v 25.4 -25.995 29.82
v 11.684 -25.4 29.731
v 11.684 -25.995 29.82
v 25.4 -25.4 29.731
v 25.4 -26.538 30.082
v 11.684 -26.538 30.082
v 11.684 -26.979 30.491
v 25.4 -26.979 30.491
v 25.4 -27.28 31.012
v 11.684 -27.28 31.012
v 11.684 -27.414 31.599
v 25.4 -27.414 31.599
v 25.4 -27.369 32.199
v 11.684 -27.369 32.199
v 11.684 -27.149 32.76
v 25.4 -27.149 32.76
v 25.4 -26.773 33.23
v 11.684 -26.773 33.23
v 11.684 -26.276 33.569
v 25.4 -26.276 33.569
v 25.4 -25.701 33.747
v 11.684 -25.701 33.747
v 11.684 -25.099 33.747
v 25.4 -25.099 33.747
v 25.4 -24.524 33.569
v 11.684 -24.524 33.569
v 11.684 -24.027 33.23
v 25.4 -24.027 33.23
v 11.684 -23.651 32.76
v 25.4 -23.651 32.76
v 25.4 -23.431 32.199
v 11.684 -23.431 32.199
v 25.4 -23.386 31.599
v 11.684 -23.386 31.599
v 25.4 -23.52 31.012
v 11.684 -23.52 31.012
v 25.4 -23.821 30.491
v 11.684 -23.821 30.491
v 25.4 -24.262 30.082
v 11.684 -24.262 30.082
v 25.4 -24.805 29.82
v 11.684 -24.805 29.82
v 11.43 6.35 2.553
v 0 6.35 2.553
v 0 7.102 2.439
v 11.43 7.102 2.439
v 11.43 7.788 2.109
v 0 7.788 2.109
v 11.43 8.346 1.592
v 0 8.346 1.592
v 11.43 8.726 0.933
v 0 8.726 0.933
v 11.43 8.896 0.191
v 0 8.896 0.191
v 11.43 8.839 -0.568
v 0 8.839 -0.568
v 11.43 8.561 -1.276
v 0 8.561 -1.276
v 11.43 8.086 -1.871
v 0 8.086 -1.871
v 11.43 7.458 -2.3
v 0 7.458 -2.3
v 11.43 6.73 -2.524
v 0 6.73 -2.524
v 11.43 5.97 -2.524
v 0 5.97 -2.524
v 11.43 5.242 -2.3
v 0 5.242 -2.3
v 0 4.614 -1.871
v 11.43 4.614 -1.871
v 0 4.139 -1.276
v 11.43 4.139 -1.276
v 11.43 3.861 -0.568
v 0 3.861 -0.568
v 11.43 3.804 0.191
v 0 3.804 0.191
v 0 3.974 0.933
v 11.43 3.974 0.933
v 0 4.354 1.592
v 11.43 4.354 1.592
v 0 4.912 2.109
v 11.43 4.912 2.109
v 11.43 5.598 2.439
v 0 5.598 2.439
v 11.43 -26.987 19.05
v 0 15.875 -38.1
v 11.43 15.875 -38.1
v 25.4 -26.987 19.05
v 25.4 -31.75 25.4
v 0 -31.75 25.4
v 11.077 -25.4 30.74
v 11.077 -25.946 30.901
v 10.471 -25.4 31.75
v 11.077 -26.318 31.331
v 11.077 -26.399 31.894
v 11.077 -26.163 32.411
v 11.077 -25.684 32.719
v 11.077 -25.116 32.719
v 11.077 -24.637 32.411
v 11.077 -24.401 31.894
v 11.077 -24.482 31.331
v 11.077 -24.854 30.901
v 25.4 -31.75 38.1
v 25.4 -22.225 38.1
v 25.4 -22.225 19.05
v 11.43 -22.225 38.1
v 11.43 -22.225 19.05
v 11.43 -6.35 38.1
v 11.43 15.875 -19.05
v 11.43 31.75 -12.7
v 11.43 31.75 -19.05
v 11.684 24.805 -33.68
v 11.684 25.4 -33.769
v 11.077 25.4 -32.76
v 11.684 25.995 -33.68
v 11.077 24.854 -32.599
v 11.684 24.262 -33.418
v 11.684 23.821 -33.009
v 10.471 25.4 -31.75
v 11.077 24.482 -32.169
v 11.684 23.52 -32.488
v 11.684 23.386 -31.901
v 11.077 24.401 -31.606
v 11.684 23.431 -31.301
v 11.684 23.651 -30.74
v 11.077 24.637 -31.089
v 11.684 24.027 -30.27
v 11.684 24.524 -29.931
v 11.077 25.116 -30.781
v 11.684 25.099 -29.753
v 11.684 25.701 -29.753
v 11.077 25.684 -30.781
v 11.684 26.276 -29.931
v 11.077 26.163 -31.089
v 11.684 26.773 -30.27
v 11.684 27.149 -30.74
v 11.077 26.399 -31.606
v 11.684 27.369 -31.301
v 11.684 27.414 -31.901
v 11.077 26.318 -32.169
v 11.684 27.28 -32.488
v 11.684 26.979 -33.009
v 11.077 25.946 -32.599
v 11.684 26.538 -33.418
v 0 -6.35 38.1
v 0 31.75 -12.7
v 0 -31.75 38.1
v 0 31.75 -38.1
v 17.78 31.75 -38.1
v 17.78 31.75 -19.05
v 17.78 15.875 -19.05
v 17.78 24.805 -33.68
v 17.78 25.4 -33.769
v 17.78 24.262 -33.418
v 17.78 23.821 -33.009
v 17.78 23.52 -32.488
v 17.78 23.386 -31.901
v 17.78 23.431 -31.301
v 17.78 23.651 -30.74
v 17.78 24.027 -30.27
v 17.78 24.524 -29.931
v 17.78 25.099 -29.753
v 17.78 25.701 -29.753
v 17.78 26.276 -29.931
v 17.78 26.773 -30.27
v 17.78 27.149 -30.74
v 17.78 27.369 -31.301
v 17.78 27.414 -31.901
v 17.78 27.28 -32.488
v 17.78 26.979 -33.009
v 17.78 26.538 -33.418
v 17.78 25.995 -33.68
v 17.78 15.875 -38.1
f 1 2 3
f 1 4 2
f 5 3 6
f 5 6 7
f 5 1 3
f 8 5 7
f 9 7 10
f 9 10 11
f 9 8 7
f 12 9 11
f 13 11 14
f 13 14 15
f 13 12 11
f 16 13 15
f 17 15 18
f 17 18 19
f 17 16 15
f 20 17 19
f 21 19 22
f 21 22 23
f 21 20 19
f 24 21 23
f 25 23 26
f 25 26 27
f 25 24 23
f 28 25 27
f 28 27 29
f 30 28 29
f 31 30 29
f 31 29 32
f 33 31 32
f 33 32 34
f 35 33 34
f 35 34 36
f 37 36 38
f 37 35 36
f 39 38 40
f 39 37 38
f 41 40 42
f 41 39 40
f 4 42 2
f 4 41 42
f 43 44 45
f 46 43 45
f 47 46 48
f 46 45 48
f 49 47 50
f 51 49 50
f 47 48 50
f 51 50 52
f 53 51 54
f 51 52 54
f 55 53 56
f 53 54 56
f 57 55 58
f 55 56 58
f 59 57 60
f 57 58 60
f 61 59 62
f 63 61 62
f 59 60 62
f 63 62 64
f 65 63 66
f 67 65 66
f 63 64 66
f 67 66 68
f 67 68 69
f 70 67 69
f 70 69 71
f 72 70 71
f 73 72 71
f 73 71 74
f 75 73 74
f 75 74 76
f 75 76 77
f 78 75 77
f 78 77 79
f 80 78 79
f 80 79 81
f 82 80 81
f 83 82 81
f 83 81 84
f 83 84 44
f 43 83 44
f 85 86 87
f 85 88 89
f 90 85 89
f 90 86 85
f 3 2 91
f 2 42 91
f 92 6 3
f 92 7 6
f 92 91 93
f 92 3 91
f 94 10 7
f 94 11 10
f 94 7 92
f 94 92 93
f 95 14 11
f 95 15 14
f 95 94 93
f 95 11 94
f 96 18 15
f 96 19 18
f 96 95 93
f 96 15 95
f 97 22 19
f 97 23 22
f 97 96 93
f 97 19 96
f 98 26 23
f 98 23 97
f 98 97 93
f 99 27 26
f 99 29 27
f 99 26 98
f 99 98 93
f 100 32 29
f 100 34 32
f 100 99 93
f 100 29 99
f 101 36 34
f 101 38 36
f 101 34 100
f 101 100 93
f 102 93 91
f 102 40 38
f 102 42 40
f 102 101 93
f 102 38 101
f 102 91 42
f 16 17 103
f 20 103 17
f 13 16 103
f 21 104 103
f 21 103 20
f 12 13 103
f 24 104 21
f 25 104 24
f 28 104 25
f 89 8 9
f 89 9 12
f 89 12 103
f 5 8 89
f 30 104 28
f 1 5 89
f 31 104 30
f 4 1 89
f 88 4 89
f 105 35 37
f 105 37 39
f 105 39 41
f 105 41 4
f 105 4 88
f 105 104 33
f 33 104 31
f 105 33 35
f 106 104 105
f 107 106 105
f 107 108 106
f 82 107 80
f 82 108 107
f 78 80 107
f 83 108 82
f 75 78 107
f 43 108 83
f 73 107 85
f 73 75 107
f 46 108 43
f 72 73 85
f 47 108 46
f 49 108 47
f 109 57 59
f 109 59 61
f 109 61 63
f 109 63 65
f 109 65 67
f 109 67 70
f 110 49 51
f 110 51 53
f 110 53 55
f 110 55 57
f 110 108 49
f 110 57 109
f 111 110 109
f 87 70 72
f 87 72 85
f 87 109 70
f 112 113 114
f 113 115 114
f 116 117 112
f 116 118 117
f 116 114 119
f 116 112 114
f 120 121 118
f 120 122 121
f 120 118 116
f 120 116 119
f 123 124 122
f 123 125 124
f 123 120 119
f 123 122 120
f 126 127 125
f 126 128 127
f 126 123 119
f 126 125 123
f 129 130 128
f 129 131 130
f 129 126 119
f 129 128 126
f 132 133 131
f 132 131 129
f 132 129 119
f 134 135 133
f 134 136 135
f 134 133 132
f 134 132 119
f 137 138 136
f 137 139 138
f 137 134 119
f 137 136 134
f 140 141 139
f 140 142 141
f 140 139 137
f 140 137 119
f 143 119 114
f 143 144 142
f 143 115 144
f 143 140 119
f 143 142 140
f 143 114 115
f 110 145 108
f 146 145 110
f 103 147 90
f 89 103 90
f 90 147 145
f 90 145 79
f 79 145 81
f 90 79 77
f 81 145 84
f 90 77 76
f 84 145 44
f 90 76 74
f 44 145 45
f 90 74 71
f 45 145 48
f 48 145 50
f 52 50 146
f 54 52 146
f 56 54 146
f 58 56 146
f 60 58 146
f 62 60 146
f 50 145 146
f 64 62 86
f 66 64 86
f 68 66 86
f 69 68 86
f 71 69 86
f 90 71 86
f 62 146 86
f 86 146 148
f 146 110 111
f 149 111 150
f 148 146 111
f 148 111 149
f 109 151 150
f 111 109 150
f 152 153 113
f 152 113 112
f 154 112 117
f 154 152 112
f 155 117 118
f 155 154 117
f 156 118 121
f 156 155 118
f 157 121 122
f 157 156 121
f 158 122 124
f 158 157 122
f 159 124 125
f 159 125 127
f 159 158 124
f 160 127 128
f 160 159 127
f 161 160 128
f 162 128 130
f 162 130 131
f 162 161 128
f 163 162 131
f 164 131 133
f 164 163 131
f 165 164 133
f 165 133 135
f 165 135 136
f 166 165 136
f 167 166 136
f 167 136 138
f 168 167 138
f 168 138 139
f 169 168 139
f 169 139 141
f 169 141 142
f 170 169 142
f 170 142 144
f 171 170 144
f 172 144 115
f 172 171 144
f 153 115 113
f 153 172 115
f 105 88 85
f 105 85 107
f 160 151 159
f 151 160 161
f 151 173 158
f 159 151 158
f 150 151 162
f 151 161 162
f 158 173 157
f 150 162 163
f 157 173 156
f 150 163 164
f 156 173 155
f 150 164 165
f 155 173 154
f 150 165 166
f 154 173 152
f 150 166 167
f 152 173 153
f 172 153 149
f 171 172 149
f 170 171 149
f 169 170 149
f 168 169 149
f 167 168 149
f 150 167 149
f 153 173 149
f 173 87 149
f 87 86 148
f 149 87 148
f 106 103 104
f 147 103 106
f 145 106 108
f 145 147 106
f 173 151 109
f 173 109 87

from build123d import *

# Parameters (mm, degrees)
SKETCH1_W                   = 76.2
SKETCH1_H                   = 63.5
BOSS_EXTRUDE1_DEPTH         = 25.4
SKETCH2_W                   = 38.1
SKETCH2_H                   = 63.5
CUT_EXTRUDE1_DEPTH          = 13.97
F_1_4_20_TAPPED_HOLE1_D     = 5.1054
F_1_4_20_TAPPED_HOLE1_DEPTH = 19.05
F_1_4_20_TAPPED_HOLE1_TIP   = 1.533816902
LPATTERN1_COUNT             = 2
LPATTERN1_PITCH             = 50.8
LPATTERN1_COUNT_DIR2        = 2
LPATTERN1_PITCH_DIR2        = 63.5
SKETCH7_W                   = 76.2
SKETCH7_H                   = 38.1
CUT_EXTRUDE2_DEPTH          = 13.97
SKETCH8_OUTSIDE_W           = 98.678
SKETCH8_OUTSIDE_H           = 85.978
CUT_EXTRUDE3_DEPTH          = 56.72102386
SKETCH9_W                   = 7.62
SKETCH9_H                   = 15.875
CUT_EXTRUDE4_DEPTH          = 87.36933773


with BuildPart() as part:
    # Sketch1 → Boss-Extrude1 (new body)
    with BuildSketch(Plane(origin=(0, 0, 0), x_dir=(0, 0, -1), z_dir=(1, 0, 0))):
        Rectangle(SKETCH1_W, SKETCH1_H)
    extrude(amount=BOSS_EXTRUDE1_DEPTH)

    # Sketch2 → Cut-Extrude1 (cut)
    with BuildSketch(Plane(origin=(25.4, 0, 0), x_dir=(0, 0, -1), z_dir=(1, 0, 0))):
        Rectangle(SKETCH2_W, SKETCH2_H)
    extrude(amount=-CUT_EXTRUDE1_DEPTH, mode=Mode.SUBTRACT)

    # Sketch5 → #10-32 Tapped Hole1 (revolve, cut)
    with BuildSketch(Plane(origin=(25.4, 25.4, 31.75), x_dir=(0, 0, -1), z_dir=(0, 1, 0))):
        Polygon((0, 0), (0, 14.929317848), (2.0193, 13.716), (2.0193, 0), align=None)
    f_10_32_tapped_hole1 = revolve(axis=Axis((31.75, 25.4, 31.75), (-1, 0, 0)), mode=Mode.SUBTRACT)

    # 1/4-20 Tapped Hole1
    with Locations(Plane(origin=(11.43, 0, 0), x_dir=(0, 0, -1), z_dir=(1, 0, 0))):
        with Locations((0, 6.35)):
            Hole(F_1_4_20_TAPPED_HOLE1_D / 2, depth=F_1_4_20_TAPPED_HOLE1_DEPTH)
            with Locations((0, 0, -(F_1_4_20_TAPPED_HOLE1_DEPTH + F_1_4_20_TAPPED_HOLE1_TIP / 2))):  # 118° drill point
                Cone(0, F_1_4_20_TAPPED_HOLE1_D / 2, F_1_4_20_TAPPED_HOLE1_TIP, mode=Mode.SUBTRACT)

    # LPattern1: 10-32 Tapped Hole1 2 × 2
    with Locations(*[(0, -i * LPATTERN1_PITCH, -j * LPATTERN1_PITCH_DIR2) for i in range(LPATTERN1_COUNT) for j in range(LPATTERN1_COUNT_DIR2) if (i, j) != (0, 0)]):
        add(f_10_32_tapped_hole1, mode=Mode.SUBTRACT)

    # Sketch7 → Cut-Extrude2 (cut)
    with BuildSketch(Plane(origin=(25.4, 0, 0), x_dir=(0, 0, -1), z_dir=(1, 0, 0))):
        with Locations((0, -3.175)):
            Rectangle(SKETCH7_W, SKETCH7_H)
    extrude(amount=-CUT_EXTRUDE2_DEPTH, mode=Mode.SUBTRACT)

    # Sketch8 outside → Cut-Extrude3 (cut, through all)
    with BuildSketch(Plane.ZY):
        Rectangle(SKETCH8_OUTSIDE_W, SKETCH8_OUTSIDE_H)
        Polygon((-38.1, 15.875), (25.4, -31.75), (38.1, -31.75), (39.3192, -7.2644), (-12.7, 31.75), (-38.1, 31.75), align=None, mode=Mode.SUBTRACT)
    extrude(amount=-CUT_EXTRUDE3_DEPTH, mode=Mode.SUBTRACT)

    # Sketch9 → Cut-Extrude4 (cut, through all)
    with BuildSketch(Plane(origin=(0, 0, -38.1), x_dir=(-1, 0, 0), z_dir=(0, 0, -1))):
        with Locations((-21.59, 23.8125)):
            Rectangle(SKETCH9_W, SKETCH9_H)
    extrude(amount=-CUT_EXTRUDE4_DEPTH, mode=Mode.SUBTRACT)


solid = part.part
